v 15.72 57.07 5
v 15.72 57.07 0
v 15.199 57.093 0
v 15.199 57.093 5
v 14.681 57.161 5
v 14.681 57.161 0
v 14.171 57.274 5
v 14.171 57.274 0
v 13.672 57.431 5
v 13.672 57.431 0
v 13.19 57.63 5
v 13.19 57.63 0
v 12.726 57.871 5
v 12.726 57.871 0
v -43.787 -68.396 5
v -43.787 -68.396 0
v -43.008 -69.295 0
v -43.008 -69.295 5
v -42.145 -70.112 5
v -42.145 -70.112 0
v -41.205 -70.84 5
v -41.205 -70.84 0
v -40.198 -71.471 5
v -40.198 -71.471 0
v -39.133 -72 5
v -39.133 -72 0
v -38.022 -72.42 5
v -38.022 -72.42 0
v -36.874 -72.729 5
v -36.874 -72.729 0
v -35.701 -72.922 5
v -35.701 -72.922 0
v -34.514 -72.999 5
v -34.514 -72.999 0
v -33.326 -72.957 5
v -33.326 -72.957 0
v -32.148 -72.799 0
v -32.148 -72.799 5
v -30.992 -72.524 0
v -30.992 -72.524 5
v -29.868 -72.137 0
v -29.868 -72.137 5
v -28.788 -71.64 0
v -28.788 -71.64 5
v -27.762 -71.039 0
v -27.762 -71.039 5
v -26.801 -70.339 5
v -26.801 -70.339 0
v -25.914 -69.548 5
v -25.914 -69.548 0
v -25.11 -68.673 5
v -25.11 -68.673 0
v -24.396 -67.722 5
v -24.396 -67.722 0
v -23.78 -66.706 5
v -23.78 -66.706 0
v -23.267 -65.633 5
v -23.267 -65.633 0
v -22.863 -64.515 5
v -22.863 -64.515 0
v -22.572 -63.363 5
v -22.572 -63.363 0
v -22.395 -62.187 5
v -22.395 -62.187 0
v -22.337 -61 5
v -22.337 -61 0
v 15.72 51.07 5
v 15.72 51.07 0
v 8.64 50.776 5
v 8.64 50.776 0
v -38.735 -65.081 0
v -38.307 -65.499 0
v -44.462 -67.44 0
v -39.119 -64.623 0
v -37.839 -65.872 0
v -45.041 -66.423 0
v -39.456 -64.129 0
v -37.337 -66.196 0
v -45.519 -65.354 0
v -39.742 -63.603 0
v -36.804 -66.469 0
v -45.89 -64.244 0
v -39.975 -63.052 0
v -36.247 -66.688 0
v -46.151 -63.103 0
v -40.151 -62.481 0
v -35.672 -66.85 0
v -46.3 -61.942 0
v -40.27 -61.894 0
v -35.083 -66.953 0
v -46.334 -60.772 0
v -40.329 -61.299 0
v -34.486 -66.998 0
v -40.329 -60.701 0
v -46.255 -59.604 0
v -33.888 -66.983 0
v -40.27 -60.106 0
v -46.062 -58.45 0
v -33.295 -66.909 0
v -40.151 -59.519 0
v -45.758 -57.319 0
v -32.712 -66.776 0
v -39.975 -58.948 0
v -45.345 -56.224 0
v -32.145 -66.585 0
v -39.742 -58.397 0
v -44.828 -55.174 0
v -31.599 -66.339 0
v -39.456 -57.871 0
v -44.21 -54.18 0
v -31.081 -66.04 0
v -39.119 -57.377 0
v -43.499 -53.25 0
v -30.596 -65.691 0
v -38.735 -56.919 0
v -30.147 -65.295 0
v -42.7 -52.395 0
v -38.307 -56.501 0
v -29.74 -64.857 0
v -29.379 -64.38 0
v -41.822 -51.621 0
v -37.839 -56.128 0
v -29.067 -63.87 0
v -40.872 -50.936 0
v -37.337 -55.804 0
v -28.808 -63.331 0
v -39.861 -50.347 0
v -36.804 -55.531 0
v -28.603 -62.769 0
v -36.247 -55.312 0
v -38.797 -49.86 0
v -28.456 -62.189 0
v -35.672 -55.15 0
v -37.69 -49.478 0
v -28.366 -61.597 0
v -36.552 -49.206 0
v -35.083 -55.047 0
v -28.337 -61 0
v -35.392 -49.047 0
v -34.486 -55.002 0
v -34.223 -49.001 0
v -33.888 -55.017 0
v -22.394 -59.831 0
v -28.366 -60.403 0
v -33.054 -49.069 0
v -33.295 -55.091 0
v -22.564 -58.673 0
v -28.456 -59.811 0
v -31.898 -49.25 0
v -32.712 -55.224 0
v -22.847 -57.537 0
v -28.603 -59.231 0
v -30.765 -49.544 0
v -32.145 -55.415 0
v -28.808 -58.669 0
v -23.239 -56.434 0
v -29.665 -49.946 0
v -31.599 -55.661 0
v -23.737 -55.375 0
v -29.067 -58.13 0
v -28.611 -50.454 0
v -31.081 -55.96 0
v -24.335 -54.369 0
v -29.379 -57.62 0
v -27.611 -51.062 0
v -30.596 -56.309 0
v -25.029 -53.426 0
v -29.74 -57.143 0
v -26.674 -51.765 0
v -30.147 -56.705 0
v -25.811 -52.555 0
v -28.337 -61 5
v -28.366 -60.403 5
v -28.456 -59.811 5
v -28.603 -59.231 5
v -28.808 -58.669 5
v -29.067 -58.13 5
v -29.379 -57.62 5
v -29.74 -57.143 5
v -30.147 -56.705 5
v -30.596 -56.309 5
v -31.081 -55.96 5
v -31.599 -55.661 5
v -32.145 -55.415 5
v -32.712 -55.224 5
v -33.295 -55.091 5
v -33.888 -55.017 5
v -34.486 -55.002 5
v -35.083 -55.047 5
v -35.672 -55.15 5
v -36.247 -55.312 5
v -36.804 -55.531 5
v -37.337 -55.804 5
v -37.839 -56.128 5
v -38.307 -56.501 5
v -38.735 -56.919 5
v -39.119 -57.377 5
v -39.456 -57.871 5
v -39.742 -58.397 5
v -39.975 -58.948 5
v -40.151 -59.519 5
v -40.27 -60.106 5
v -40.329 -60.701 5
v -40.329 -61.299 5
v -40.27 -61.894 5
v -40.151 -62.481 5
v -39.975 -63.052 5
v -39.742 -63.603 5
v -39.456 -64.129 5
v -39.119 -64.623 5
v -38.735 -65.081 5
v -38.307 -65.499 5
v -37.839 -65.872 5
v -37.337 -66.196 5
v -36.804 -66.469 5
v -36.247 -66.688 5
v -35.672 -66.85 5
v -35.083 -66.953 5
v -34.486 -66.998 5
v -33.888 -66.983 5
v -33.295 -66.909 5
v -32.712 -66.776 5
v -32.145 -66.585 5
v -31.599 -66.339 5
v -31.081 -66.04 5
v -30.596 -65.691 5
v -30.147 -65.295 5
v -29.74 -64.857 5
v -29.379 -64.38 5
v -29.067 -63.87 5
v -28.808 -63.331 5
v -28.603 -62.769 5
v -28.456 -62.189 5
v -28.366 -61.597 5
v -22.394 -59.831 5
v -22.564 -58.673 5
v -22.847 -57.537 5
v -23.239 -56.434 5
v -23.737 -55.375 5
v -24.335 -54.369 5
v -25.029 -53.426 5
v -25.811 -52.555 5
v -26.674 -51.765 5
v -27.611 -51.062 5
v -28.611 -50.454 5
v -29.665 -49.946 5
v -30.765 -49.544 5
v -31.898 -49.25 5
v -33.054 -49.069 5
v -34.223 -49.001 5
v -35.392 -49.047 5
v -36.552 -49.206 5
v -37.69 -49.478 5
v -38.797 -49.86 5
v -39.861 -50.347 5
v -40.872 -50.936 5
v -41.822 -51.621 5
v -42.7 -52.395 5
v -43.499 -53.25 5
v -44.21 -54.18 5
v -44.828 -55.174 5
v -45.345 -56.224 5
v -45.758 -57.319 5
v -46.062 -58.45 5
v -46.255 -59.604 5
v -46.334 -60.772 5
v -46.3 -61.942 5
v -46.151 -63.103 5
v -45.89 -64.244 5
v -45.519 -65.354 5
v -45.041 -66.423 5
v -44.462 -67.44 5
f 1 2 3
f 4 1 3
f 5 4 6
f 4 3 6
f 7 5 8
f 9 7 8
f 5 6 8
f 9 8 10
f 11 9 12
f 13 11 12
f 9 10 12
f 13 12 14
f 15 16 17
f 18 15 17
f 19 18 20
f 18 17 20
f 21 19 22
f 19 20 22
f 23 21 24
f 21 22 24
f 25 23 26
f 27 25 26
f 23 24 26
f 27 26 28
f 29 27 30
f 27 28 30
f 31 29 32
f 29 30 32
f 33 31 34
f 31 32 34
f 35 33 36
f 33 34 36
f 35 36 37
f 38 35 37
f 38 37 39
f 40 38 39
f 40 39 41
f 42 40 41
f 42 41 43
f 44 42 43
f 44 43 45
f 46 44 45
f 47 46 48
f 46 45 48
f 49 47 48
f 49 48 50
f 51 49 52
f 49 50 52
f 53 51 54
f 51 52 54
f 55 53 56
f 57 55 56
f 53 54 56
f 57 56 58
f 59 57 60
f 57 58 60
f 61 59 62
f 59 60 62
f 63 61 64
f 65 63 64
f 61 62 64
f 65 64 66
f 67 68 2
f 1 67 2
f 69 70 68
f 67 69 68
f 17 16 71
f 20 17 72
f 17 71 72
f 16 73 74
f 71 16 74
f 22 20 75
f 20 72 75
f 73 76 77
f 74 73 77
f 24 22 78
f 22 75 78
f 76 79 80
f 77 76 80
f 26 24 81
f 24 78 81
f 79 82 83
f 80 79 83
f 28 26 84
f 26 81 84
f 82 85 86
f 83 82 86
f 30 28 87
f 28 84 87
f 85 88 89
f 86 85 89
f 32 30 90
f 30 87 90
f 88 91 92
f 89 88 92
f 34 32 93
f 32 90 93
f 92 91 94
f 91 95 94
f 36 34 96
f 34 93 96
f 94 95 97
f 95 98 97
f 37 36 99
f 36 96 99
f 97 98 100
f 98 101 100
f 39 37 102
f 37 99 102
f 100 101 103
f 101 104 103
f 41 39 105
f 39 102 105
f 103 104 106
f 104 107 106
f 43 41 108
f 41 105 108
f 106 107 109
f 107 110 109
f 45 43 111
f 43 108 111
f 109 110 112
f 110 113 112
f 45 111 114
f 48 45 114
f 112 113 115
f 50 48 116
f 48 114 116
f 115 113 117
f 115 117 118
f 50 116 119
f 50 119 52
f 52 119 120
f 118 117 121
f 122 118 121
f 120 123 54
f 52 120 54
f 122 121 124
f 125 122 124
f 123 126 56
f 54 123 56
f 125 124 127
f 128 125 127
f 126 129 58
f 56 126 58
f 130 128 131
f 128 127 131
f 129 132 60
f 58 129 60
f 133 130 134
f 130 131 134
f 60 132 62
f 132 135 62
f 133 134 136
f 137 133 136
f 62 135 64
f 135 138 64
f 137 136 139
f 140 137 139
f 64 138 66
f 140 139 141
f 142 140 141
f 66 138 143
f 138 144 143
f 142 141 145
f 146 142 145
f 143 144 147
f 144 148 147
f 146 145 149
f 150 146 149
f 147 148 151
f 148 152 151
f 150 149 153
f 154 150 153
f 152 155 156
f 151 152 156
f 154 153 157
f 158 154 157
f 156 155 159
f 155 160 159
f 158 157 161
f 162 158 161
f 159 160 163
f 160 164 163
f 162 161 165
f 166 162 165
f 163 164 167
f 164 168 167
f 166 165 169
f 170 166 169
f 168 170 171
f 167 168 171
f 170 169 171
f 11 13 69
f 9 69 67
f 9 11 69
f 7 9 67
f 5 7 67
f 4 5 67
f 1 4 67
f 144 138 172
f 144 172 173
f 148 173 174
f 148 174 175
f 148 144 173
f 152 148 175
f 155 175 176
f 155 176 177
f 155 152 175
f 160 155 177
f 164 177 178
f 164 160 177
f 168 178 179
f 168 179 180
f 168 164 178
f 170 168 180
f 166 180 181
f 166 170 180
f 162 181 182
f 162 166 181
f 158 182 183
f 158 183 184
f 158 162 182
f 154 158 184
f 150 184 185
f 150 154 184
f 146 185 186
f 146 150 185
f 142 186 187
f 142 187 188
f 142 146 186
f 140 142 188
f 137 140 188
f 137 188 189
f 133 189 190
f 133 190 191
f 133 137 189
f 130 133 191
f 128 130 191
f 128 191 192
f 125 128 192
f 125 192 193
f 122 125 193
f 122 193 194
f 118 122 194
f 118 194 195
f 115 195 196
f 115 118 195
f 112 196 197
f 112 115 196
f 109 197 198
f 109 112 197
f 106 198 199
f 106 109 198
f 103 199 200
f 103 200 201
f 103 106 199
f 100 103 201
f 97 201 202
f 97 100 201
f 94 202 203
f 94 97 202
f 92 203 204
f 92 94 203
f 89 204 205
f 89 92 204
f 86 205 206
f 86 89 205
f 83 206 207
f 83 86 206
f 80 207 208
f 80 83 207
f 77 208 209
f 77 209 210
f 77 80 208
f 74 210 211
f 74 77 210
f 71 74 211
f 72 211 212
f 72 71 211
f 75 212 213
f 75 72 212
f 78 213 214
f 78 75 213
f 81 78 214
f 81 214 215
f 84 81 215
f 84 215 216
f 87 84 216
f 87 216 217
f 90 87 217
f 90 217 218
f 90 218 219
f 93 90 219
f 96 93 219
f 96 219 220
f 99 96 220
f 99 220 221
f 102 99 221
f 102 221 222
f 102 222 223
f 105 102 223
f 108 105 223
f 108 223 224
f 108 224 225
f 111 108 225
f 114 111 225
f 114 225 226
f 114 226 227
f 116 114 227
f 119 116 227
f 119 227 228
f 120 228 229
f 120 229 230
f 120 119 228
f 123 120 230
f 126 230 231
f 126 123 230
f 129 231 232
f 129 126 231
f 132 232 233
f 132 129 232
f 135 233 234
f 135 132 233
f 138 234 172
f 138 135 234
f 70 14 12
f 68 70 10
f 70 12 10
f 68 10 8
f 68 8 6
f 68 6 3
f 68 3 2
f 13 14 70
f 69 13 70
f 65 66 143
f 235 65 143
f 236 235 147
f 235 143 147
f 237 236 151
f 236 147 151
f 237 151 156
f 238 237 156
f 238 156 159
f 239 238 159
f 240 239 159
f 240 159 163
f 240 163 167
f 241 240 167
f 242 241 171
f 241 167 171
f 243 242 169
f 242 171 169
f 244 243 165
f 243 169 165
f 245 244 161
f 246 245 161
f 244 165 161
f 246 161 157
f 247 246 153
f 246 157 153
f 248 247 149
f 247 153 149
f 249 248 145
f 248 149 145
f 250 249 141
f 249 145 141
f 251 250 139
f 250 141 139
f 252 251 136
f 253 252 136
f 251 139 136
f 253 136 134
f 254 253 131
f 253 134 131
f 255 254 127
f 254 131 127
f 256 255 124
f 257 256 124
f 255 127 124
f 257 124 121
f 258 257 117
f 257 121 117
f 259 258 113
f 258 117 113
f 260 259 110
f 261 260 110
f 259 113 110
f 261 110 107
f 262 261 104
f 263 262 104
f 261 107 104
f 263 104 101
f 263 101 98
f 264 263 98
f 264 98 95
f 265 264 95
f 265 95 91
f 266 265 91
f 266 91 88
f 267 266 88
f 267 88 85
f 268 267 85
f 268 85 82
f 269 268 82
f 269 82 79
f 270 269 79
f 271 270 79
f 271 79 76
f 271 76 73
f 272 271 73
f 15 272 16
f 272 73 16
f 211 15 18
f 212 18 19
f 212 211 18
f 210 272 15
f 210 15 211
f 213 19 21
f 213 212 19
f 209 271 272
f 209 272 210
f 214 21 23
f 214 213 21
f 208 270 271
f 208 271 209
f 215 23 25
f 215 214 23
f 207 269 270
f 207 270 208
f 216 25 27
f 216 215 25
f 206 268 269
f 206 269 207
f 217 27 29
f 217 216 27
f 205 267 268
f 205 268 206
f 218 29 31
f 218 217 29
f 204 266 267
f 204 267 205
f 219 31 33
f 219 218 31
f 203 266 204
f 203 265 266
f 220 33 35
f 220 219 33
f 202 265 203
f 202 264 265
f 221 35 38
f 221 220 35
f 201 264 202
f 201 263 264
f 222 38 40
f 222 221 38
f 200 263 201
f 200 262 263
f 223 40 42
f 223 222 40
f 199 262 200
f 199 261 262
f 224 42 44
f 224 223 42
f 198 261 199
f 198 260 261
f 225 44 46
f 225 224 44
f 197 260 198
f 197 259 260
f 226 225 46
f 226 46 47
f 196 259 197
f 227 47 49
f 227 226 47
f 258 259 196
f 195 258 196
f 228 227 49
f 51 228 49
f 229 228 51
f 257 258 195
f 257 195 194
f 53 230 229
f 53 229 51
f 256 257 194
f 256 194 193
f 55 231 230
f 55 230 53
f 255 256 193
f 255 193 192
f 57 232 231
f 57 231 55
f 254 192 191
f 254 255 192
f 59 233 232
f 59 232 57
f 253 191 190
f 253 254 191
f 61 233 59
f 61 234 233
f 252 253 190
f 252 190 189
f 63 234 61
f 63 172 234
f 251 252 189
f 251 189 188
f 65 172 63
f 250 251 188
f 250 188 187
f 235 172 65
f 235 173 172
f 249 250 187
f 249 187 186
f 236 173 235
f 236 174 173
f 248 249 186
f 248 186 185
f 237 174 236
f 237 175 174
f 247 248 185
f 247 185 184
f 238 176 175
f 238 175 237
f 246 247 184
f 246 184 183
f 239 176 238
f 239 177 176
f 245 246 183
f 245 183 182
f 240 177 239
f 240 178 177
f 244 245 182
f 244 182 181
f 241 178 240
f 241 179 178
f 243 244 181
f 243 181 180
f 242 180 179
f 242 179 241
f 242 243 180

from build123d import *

# Parameters (mm, degrees)
F1_DEPTH = 5
F0_R     = 6


with BuildPart() as f1:
    # F0 (on Top) → F1 (new body)
    with BuildSketch(Plane.XY):
        with BuildLine():
            Line((12.7260516557, 57.8709565262), (8.6399699737, 50.7760246323))
            Line((8.6399699737, 50.7760246323), (15.7204552226, 51.0703360352))
            Line((15.7204552226, 51.0703360352), (15.7204552226, 57.0703360352))
            ThreePointArc((15.7204552226, 57.0703360352), (14.1706612127, 57.2739459063), (12.7260516557, 57.8709565262))
        make_face()
    extrude(amount=F1_DEPTH)


with BuildPart() as f1b:
    # F0 (on Top) → F1, piece 2 (new body)
    with BuildSketch(Plane.XY):
        with BuildLine():
            ThreePointArc((-43.7865273393, -68.3958295986), (-30.4250157042, -72.344591111), (-22.3365694268, -61))
            ThreePointArc((-22.3365694268, -61), (-38.2481231494, -49.655408889), (-43.7865273393, -68.3958295986))
        make_face()
        with Locations((-34.3365694268, -61)):
            Circle(F0_R, mode=Mode.SUBTRACT)
    extrude(amount=F1_DEPTH)


solid = Compound([f1.part, f1b.part])
